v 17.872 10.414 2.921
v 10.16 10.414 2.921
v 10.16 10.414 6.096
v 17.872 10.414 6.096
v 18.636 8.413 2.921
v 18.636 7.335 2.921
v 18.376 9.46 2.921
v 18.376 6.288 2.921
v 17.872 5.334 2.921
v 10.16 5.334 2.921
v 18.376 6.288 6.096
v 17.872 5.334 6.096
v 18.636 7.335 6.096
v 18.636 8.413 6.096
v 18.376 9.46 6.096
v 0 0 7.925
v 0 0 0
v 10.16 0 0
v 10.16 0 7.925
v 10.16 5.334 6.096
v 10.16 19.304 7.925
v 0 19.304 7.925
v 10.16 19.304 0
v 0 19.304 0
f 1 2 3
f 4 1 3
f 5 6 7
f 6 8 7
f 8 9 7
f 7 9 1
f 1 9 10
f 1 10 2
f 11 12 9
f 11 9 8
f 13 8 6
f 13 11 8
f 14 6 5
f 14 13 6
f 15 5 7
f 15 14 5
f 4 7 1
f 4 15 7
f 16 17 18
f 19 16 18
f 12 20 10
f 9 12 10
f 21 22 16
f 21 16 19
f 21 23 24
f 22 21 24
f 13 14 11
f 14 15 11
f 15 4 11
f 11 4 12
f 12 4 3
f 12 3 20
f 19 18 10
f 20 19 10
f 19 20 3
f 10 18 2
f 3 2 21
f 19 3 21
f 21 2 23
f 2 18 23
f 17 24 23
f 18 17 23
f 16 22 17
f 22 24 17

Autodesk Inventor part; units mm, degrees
ref_plane "YZ Plane" through (0, 0, 0) normal (1, 0, 0) x (0, 1, 0)
ref_plane "XZ Plane" through (0, 0, 0) normal (0, 1, 0) x (-1, 0, 0)
ref_plane "XY Plane" through (0, 0, 0) normal (0, 0, 1) x (1, 0, 0)
sketch "Sketch1" plane through (0, 0, 0) normal (0, 0, 1) x (1, 0, 0)
  line L0 (0, 0) -> (10.16, 0)
  line L1 (10.16, 0) -> (10.16, 19.304)
  line L2 (10.16, 19.304) -> (0, 19.304)
  line L3 (0, 19.304) -> (0, 0)
  dimension "d0" = 10.16
  dimension "d1" = 19.304
extrude "Extrusion1" add sketch "Sketch1" along normal blind 7.9248
sketch "Sketch2" plane through (10.16, 0, 0) normal (1, 0, 0) x (0, 0, -1)
  line L0 (0, 0) -> (-7.9248, 0) projected
  line L1 (0, 0) -> (0, 19.304) projected
  line L2 (0, 19.304) -> (-7.9248, 19.304) projected
  line L3 (-2.921, 10.414) -> (-6.096, 10.414)
  line L4 (-6.096, 10.414) -> (-6.096, 5.334)
  line L5 (-6.096, 5.334) -> (-2.921, 5.334)
  line L6 (-2.921, 5.334) -> (-2.921, 10.414)
  line L7 (-6.096, 10.414) -> (-6.096, 13.97)
  line L8 (-6.096, 13.97) -> (-2.921, 13.97)
  line L9 (-2.921, 13.97) -> (-2.921, 10.414)
  dimension "d5" = 5.08
  dimension "d6" = 3.175
  dimension "d9" = 2.921
  dimension "d10" = 3.556
  dimension "d11" = 5.334
  dimension "d13" = 5.334
extrude "Extrusion2" add sketch "Sketch2" along normal blind 8.509 contours L6 L5 L4 L3
sketch "Sketch3" plane through (10.16, 5.334, 6.096) normal (0, 0, 1) x (1, 0, 0)
  line L0 (8.509, 0) -> (8.509, 5.08) projected
  line L1 (0, 5.08) -> (8.509, 5.08) projected
  line L2 (0, 0) -> (0, 5.08) projected
  line L3 (0, 0) -> (8.509, 0) projected
  arc A0 (7.7118, 0) -> (7.7118, 5.08) centre (4.064, 2.54) ccw
  point P0 (-10.16, -5.334)
  dimension "d17" = 4.445
extrude "Extrusion3" cut sketch "Sketch3" against normal through all contours L3 A0 L0 | A0 L1 L0
equation "\"d11\" = d13"
properties part number "power_switch"
